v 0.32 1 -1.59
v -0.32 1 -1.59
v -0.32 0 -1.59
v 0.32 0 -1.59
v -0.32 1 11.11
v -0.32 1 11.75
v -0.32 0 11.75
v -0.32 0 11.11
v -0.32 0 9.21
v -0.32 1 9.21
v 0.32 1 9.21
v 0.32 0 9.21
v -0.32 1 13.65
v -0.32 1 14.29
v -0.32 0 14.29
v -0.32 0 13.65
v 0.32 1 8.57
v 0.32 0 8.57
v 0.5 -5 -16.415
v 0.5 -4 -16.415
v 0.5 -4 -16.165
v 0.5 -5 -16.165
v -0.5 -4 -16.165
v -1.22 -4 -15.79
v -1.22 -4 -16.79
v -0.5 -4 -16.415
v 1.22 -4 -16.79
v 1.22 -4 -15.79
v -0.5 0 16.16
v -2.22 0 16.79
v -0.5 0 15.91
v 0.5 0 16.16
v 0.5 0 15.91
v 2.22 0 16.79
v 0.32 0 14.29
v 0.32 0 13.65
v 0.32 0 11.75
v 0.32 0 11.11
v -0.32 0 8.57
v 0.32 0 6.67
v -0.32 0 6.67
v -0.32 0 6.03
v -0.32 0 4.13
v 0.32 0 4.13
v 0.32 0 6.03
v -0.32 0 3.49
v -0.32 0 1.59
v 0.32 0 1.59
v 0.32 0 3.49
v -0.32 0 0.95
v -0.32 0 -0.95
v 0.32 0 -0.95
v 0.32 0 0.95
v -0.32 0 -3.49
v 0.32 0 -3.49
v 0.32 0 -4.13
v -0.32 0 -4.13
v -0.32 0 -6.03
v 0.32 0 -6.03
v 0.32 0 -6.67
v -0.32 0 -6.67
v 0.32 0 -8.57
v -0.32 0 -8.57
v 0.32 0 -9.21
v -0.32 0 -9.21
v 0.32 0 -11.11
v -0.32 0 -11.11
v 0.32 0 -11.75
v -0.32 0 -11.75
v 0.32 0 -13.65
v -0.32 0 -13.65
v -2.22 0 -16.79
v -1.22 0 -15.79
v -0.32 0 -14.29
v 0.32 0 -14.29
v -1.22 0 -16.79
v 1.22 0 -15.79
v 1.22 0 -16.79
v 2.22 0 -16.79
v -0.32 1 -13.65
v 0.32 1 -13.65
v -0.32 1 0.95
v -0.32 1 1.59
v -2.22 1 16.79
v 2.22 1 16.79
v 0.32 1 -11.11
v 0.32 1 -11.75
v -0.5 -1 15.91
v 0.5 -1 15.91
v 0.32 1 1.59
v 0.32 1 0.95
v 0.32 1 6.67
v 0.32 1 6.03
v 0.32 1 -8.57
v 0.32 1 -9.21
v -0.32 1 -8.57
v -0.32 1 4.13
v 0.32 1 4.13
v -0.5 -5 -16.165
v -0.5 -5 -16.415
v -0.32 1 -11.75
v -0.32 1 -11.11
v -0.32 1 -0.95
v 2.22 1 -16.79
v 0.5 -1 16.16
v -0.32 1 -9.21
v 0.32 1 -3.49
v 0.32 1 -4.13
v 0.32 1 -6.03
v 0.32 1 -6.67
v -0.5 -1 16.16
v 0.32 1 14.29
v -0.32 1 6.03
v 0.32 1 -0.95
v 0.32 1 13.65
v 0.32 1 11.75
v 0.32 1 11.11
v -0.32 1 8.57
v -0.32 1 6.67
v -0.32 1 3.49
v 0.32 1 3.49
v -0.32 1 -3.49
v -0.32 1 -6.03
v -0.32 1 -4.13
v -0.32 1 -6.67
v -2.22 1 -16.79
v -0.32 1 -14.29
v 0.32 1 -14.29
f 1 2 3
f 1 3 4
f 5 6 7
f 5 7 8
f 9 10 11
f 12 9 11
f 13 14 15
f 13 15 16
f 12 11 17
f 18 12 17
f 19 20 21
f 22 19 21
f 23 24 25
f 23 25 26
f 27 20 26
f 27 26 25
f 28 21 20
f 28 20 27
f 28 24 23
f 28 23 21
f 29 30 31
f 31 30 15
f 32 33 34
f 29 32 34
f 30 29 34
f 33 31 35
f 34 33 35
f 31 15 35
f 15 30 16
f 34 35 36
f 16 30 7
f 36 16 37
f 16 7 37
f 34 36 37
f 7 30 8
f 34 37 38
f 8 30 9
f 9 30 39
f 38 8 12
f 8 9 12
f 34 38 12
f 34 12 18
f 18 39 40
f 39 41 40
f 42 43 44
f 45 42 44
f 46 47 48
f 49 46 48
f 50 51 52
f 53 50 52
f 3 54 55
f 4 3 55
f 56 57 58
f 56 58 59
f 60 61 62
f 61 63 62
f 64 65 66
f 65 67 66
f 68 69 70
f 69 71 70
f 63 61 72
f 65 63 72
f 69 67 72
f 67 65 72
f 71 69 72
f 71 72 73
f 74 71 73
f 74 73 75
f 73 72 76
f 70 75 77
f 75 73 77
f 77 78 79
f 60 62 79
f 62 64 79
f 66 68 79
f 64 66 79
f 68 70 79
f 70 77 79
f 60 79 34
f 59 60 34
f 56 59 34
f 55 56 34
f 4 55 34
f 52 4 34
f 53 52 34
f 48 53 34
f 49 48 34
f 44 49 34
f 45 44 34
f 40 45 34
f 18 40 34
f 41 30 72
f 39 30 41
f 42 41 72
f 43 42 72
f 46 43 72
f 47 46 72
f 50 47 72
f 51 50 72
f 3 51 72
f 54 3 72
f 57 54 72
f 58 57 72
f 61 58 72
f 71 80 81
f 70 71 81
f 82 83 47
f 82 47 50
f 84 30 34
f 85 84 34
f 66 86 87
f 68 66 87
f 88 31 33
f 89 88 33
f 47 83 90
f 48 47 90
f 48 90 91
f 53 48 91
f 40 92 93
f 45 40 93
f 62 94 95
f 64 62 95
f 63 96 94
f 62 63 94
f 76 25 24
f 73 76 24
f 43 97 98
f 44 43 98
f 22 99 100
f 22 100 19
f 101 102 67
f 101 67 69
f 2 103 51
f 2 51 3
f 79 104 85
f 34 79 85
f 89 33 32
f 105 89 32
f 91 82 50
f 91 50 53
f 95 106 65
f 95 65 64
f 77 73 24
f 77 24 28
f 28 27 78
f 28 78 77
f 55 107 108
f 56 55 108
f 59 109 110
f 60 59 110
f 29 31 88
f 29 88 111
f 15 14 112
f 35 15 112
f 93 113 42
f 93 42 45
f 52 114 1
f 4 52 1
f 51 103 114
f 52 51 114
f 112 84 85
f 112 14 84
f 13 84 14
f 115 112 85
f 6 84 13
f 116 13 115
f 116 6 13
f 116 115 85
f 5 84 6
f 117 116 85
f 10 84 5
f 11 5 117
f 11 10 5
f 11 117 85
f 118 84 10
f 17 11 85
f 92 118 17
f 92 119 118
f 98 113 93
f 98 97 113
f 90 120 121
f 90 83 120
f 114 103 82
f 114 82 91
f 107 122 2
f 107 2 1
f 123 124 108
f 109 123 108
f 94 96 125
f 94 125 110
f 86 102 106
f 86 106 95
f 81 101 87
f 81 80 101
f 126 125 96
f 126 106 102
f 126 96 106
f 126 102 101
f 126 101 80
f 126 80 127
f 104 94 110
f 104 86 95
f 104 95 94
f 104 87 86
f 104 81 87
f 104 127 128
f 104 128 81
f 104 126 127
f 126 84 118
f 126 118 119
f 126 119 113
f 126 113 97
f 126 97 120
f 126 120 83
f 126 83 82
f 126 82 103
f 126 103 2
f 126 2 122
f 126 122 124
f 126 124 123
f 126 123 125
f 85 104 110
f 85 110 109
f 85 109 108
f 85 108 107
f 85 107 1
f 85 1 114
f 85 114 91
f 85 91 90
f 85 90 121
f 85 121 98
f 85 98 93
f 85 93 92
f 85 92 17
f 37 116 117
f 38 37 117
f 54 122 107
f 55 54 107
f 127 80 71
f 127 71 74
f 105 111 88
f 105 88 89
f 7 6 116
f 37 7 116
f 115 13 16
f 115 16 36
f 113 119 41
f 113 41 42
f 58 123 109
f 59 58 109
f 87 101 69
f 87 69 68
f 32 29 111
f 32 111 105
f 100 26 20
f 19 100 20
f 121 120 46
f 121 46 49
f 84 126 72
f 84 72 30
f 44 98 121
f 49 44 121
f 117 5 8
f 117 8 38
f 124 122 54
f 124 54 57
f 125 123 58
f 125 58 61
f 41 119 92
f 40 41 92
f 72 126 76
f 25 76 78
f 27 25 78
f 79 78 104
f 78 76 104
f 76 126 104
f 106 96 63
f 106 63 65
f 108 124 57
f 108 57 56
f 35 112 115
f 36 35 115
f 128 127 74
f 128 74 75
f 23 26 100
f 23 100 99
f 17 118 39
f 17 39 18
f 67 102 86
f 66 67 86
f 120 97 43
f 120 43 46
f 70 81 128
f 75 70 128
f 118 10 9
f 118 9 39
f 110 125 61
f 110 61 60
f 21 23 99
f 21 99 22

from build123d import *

# Parameters (mm, degrees)
SZKIC1_W                    = 4.44
SZKIC1_H                    = 33.58
DODANIE_WYCI_GNI_CIE1_DEPTH = 1
SZKIC2_W                    = 0.64
SZKIC2_H                    = 0.64
WYTNIJ_WYCI_GNI_CIE1_DEPTH  = 1
SZKIC3_W                    = 1
SZKIC3_H                    = 0.25
DODANIE_WYCI_GNI_CIE2_DEPTH = 1
SZKIC4_W                    = 4.44
SZKIC4_H                    = 1
DODANIE_WYCI_GNI_CIE3_DEPTH = 4
SZKIC5_W                    = 1
SZKIC5_H                    = 0.25
DODANIE_WYCI_GNI_CIE4_DEPTH = 1
SZKIC6_W                    = 1
SZKIC6_H                    = 1
WYTNIJ_WYCI_GNI_CIE2_DEPTH  = 4


with BuildPart() as part:
    # Szkic1 → Dodanie-wyciągnięcie1 (new body)
    with BuildSketch(Plane(origin=(0, 0, 0), x_dir=(1, 0, 0), z_dir=(0, 1, 0))):
        Rectangle(SZKIC1_W, SZKIC1_H)
    extrude(amount=DODANIE_WYCI_GNI_CIE1_DEPTH)

    # Szkic2 → Wytnij-wyciągnięcie1 (cut)
    with BuildSketch(Plane(origin=(0, 1, 0), x_dir=(1, 0, 0), z_dir=(0, 1, 0))):
        with Locations((0, -13.97)):
            Rectangle(SZKIC2_W, SZKIC2_H)
        with Locations((0, -11.43)):
            Rectangle(SZKIC2_W, SZKIC2_H)
        with Locations((0, -8.89)):
            Rectangle(SZKIC2_W, SZKIC2_H)
        with Locations((0, -6.35)):
            Rectangle(SZKIC2_W, SZKIC2_H)
        with Locations((0, -3.81)):
            Rectangle(SZKIC2_W, SZKIC2_H)
        with Locations((0, -1.27)):
            Rectangle(SZKIC2_W, SZKIC2_H)
        with Locations((0, 1.27)):
            Rectangle(SZKIC2_W, SZKIC2_H)
        with Locations((0, 3.81)):
            Rectangle(SZKIC2_W, SZKIC2_H)
        with Locations((0, 6.35)):
            Rectangle(SZKIC2_W, SZKIC2_H)
        with Locations((0, 8.89)):
            Rectangle(SZKIC2_W, SZKIC2_H)
        with Locations((0, 11.43)):
            Rectangle(SZKIC2_W, SZKIC2_H)
        with Locations((0, 13.97)):
            Rectangle(SZKIC2_W, SZKIC2_H)
    extrude(amount=-WYTNIJ_WYCI_GNI_CIE1_DEPTH, mode=Mode.SUBTRACT)

    # Szkic3 → Dodanie-wyciągnięcie2 (add)
    with BuildSketch(Plane.XZ):
        with Locations((0, 16.0350189)):
            Rectangle(SZKIC3_W, SZKIC3_H)
    extrude(amount=DODANIE_WYCI_GNI_CIE2_DEPTH)

    # Szkic4 → Dodanie-wyciągnięcie3 (add)
    with BuildSketch(Plane.XZ):
        with Locations((0, -16.29)):
            Rectangle(SZKIC4_W, SZKIC4_H)
    extrude(amount=DODANIE_WYCI_GNI_CIE3_DEPTH)

    # Szkic5 → Dodanie-wyciągnięcie4 (add)
    with BuildSketch(Plane.XZ.offset(4)):
        with Locations((0, -16.29)):
            Rectangle(SZKIC5_W, SZKIC5_H)
    extrude(amount=DODANIE_WYCI_GNI_CIE4_DEPTH)

    # Szkic6 → Wytnij-wyciągnięcie2 (cut)
    with BuildSketch(Plane.XZ.offset(4)):
        with Locations((1.72, -16.29)):
            Rectangle(SZKIC6_W, SZKIC6_H)
        with Locations((-1.72, -16.29)):
            Rectangle(SZKIC6_W, SZKIC6_H)
    extrude(amount=-WYTNIJ_WYCI_GNI_CIE2_DEPTH, mode=Mode.SUBTRACT)


solid = part.part
